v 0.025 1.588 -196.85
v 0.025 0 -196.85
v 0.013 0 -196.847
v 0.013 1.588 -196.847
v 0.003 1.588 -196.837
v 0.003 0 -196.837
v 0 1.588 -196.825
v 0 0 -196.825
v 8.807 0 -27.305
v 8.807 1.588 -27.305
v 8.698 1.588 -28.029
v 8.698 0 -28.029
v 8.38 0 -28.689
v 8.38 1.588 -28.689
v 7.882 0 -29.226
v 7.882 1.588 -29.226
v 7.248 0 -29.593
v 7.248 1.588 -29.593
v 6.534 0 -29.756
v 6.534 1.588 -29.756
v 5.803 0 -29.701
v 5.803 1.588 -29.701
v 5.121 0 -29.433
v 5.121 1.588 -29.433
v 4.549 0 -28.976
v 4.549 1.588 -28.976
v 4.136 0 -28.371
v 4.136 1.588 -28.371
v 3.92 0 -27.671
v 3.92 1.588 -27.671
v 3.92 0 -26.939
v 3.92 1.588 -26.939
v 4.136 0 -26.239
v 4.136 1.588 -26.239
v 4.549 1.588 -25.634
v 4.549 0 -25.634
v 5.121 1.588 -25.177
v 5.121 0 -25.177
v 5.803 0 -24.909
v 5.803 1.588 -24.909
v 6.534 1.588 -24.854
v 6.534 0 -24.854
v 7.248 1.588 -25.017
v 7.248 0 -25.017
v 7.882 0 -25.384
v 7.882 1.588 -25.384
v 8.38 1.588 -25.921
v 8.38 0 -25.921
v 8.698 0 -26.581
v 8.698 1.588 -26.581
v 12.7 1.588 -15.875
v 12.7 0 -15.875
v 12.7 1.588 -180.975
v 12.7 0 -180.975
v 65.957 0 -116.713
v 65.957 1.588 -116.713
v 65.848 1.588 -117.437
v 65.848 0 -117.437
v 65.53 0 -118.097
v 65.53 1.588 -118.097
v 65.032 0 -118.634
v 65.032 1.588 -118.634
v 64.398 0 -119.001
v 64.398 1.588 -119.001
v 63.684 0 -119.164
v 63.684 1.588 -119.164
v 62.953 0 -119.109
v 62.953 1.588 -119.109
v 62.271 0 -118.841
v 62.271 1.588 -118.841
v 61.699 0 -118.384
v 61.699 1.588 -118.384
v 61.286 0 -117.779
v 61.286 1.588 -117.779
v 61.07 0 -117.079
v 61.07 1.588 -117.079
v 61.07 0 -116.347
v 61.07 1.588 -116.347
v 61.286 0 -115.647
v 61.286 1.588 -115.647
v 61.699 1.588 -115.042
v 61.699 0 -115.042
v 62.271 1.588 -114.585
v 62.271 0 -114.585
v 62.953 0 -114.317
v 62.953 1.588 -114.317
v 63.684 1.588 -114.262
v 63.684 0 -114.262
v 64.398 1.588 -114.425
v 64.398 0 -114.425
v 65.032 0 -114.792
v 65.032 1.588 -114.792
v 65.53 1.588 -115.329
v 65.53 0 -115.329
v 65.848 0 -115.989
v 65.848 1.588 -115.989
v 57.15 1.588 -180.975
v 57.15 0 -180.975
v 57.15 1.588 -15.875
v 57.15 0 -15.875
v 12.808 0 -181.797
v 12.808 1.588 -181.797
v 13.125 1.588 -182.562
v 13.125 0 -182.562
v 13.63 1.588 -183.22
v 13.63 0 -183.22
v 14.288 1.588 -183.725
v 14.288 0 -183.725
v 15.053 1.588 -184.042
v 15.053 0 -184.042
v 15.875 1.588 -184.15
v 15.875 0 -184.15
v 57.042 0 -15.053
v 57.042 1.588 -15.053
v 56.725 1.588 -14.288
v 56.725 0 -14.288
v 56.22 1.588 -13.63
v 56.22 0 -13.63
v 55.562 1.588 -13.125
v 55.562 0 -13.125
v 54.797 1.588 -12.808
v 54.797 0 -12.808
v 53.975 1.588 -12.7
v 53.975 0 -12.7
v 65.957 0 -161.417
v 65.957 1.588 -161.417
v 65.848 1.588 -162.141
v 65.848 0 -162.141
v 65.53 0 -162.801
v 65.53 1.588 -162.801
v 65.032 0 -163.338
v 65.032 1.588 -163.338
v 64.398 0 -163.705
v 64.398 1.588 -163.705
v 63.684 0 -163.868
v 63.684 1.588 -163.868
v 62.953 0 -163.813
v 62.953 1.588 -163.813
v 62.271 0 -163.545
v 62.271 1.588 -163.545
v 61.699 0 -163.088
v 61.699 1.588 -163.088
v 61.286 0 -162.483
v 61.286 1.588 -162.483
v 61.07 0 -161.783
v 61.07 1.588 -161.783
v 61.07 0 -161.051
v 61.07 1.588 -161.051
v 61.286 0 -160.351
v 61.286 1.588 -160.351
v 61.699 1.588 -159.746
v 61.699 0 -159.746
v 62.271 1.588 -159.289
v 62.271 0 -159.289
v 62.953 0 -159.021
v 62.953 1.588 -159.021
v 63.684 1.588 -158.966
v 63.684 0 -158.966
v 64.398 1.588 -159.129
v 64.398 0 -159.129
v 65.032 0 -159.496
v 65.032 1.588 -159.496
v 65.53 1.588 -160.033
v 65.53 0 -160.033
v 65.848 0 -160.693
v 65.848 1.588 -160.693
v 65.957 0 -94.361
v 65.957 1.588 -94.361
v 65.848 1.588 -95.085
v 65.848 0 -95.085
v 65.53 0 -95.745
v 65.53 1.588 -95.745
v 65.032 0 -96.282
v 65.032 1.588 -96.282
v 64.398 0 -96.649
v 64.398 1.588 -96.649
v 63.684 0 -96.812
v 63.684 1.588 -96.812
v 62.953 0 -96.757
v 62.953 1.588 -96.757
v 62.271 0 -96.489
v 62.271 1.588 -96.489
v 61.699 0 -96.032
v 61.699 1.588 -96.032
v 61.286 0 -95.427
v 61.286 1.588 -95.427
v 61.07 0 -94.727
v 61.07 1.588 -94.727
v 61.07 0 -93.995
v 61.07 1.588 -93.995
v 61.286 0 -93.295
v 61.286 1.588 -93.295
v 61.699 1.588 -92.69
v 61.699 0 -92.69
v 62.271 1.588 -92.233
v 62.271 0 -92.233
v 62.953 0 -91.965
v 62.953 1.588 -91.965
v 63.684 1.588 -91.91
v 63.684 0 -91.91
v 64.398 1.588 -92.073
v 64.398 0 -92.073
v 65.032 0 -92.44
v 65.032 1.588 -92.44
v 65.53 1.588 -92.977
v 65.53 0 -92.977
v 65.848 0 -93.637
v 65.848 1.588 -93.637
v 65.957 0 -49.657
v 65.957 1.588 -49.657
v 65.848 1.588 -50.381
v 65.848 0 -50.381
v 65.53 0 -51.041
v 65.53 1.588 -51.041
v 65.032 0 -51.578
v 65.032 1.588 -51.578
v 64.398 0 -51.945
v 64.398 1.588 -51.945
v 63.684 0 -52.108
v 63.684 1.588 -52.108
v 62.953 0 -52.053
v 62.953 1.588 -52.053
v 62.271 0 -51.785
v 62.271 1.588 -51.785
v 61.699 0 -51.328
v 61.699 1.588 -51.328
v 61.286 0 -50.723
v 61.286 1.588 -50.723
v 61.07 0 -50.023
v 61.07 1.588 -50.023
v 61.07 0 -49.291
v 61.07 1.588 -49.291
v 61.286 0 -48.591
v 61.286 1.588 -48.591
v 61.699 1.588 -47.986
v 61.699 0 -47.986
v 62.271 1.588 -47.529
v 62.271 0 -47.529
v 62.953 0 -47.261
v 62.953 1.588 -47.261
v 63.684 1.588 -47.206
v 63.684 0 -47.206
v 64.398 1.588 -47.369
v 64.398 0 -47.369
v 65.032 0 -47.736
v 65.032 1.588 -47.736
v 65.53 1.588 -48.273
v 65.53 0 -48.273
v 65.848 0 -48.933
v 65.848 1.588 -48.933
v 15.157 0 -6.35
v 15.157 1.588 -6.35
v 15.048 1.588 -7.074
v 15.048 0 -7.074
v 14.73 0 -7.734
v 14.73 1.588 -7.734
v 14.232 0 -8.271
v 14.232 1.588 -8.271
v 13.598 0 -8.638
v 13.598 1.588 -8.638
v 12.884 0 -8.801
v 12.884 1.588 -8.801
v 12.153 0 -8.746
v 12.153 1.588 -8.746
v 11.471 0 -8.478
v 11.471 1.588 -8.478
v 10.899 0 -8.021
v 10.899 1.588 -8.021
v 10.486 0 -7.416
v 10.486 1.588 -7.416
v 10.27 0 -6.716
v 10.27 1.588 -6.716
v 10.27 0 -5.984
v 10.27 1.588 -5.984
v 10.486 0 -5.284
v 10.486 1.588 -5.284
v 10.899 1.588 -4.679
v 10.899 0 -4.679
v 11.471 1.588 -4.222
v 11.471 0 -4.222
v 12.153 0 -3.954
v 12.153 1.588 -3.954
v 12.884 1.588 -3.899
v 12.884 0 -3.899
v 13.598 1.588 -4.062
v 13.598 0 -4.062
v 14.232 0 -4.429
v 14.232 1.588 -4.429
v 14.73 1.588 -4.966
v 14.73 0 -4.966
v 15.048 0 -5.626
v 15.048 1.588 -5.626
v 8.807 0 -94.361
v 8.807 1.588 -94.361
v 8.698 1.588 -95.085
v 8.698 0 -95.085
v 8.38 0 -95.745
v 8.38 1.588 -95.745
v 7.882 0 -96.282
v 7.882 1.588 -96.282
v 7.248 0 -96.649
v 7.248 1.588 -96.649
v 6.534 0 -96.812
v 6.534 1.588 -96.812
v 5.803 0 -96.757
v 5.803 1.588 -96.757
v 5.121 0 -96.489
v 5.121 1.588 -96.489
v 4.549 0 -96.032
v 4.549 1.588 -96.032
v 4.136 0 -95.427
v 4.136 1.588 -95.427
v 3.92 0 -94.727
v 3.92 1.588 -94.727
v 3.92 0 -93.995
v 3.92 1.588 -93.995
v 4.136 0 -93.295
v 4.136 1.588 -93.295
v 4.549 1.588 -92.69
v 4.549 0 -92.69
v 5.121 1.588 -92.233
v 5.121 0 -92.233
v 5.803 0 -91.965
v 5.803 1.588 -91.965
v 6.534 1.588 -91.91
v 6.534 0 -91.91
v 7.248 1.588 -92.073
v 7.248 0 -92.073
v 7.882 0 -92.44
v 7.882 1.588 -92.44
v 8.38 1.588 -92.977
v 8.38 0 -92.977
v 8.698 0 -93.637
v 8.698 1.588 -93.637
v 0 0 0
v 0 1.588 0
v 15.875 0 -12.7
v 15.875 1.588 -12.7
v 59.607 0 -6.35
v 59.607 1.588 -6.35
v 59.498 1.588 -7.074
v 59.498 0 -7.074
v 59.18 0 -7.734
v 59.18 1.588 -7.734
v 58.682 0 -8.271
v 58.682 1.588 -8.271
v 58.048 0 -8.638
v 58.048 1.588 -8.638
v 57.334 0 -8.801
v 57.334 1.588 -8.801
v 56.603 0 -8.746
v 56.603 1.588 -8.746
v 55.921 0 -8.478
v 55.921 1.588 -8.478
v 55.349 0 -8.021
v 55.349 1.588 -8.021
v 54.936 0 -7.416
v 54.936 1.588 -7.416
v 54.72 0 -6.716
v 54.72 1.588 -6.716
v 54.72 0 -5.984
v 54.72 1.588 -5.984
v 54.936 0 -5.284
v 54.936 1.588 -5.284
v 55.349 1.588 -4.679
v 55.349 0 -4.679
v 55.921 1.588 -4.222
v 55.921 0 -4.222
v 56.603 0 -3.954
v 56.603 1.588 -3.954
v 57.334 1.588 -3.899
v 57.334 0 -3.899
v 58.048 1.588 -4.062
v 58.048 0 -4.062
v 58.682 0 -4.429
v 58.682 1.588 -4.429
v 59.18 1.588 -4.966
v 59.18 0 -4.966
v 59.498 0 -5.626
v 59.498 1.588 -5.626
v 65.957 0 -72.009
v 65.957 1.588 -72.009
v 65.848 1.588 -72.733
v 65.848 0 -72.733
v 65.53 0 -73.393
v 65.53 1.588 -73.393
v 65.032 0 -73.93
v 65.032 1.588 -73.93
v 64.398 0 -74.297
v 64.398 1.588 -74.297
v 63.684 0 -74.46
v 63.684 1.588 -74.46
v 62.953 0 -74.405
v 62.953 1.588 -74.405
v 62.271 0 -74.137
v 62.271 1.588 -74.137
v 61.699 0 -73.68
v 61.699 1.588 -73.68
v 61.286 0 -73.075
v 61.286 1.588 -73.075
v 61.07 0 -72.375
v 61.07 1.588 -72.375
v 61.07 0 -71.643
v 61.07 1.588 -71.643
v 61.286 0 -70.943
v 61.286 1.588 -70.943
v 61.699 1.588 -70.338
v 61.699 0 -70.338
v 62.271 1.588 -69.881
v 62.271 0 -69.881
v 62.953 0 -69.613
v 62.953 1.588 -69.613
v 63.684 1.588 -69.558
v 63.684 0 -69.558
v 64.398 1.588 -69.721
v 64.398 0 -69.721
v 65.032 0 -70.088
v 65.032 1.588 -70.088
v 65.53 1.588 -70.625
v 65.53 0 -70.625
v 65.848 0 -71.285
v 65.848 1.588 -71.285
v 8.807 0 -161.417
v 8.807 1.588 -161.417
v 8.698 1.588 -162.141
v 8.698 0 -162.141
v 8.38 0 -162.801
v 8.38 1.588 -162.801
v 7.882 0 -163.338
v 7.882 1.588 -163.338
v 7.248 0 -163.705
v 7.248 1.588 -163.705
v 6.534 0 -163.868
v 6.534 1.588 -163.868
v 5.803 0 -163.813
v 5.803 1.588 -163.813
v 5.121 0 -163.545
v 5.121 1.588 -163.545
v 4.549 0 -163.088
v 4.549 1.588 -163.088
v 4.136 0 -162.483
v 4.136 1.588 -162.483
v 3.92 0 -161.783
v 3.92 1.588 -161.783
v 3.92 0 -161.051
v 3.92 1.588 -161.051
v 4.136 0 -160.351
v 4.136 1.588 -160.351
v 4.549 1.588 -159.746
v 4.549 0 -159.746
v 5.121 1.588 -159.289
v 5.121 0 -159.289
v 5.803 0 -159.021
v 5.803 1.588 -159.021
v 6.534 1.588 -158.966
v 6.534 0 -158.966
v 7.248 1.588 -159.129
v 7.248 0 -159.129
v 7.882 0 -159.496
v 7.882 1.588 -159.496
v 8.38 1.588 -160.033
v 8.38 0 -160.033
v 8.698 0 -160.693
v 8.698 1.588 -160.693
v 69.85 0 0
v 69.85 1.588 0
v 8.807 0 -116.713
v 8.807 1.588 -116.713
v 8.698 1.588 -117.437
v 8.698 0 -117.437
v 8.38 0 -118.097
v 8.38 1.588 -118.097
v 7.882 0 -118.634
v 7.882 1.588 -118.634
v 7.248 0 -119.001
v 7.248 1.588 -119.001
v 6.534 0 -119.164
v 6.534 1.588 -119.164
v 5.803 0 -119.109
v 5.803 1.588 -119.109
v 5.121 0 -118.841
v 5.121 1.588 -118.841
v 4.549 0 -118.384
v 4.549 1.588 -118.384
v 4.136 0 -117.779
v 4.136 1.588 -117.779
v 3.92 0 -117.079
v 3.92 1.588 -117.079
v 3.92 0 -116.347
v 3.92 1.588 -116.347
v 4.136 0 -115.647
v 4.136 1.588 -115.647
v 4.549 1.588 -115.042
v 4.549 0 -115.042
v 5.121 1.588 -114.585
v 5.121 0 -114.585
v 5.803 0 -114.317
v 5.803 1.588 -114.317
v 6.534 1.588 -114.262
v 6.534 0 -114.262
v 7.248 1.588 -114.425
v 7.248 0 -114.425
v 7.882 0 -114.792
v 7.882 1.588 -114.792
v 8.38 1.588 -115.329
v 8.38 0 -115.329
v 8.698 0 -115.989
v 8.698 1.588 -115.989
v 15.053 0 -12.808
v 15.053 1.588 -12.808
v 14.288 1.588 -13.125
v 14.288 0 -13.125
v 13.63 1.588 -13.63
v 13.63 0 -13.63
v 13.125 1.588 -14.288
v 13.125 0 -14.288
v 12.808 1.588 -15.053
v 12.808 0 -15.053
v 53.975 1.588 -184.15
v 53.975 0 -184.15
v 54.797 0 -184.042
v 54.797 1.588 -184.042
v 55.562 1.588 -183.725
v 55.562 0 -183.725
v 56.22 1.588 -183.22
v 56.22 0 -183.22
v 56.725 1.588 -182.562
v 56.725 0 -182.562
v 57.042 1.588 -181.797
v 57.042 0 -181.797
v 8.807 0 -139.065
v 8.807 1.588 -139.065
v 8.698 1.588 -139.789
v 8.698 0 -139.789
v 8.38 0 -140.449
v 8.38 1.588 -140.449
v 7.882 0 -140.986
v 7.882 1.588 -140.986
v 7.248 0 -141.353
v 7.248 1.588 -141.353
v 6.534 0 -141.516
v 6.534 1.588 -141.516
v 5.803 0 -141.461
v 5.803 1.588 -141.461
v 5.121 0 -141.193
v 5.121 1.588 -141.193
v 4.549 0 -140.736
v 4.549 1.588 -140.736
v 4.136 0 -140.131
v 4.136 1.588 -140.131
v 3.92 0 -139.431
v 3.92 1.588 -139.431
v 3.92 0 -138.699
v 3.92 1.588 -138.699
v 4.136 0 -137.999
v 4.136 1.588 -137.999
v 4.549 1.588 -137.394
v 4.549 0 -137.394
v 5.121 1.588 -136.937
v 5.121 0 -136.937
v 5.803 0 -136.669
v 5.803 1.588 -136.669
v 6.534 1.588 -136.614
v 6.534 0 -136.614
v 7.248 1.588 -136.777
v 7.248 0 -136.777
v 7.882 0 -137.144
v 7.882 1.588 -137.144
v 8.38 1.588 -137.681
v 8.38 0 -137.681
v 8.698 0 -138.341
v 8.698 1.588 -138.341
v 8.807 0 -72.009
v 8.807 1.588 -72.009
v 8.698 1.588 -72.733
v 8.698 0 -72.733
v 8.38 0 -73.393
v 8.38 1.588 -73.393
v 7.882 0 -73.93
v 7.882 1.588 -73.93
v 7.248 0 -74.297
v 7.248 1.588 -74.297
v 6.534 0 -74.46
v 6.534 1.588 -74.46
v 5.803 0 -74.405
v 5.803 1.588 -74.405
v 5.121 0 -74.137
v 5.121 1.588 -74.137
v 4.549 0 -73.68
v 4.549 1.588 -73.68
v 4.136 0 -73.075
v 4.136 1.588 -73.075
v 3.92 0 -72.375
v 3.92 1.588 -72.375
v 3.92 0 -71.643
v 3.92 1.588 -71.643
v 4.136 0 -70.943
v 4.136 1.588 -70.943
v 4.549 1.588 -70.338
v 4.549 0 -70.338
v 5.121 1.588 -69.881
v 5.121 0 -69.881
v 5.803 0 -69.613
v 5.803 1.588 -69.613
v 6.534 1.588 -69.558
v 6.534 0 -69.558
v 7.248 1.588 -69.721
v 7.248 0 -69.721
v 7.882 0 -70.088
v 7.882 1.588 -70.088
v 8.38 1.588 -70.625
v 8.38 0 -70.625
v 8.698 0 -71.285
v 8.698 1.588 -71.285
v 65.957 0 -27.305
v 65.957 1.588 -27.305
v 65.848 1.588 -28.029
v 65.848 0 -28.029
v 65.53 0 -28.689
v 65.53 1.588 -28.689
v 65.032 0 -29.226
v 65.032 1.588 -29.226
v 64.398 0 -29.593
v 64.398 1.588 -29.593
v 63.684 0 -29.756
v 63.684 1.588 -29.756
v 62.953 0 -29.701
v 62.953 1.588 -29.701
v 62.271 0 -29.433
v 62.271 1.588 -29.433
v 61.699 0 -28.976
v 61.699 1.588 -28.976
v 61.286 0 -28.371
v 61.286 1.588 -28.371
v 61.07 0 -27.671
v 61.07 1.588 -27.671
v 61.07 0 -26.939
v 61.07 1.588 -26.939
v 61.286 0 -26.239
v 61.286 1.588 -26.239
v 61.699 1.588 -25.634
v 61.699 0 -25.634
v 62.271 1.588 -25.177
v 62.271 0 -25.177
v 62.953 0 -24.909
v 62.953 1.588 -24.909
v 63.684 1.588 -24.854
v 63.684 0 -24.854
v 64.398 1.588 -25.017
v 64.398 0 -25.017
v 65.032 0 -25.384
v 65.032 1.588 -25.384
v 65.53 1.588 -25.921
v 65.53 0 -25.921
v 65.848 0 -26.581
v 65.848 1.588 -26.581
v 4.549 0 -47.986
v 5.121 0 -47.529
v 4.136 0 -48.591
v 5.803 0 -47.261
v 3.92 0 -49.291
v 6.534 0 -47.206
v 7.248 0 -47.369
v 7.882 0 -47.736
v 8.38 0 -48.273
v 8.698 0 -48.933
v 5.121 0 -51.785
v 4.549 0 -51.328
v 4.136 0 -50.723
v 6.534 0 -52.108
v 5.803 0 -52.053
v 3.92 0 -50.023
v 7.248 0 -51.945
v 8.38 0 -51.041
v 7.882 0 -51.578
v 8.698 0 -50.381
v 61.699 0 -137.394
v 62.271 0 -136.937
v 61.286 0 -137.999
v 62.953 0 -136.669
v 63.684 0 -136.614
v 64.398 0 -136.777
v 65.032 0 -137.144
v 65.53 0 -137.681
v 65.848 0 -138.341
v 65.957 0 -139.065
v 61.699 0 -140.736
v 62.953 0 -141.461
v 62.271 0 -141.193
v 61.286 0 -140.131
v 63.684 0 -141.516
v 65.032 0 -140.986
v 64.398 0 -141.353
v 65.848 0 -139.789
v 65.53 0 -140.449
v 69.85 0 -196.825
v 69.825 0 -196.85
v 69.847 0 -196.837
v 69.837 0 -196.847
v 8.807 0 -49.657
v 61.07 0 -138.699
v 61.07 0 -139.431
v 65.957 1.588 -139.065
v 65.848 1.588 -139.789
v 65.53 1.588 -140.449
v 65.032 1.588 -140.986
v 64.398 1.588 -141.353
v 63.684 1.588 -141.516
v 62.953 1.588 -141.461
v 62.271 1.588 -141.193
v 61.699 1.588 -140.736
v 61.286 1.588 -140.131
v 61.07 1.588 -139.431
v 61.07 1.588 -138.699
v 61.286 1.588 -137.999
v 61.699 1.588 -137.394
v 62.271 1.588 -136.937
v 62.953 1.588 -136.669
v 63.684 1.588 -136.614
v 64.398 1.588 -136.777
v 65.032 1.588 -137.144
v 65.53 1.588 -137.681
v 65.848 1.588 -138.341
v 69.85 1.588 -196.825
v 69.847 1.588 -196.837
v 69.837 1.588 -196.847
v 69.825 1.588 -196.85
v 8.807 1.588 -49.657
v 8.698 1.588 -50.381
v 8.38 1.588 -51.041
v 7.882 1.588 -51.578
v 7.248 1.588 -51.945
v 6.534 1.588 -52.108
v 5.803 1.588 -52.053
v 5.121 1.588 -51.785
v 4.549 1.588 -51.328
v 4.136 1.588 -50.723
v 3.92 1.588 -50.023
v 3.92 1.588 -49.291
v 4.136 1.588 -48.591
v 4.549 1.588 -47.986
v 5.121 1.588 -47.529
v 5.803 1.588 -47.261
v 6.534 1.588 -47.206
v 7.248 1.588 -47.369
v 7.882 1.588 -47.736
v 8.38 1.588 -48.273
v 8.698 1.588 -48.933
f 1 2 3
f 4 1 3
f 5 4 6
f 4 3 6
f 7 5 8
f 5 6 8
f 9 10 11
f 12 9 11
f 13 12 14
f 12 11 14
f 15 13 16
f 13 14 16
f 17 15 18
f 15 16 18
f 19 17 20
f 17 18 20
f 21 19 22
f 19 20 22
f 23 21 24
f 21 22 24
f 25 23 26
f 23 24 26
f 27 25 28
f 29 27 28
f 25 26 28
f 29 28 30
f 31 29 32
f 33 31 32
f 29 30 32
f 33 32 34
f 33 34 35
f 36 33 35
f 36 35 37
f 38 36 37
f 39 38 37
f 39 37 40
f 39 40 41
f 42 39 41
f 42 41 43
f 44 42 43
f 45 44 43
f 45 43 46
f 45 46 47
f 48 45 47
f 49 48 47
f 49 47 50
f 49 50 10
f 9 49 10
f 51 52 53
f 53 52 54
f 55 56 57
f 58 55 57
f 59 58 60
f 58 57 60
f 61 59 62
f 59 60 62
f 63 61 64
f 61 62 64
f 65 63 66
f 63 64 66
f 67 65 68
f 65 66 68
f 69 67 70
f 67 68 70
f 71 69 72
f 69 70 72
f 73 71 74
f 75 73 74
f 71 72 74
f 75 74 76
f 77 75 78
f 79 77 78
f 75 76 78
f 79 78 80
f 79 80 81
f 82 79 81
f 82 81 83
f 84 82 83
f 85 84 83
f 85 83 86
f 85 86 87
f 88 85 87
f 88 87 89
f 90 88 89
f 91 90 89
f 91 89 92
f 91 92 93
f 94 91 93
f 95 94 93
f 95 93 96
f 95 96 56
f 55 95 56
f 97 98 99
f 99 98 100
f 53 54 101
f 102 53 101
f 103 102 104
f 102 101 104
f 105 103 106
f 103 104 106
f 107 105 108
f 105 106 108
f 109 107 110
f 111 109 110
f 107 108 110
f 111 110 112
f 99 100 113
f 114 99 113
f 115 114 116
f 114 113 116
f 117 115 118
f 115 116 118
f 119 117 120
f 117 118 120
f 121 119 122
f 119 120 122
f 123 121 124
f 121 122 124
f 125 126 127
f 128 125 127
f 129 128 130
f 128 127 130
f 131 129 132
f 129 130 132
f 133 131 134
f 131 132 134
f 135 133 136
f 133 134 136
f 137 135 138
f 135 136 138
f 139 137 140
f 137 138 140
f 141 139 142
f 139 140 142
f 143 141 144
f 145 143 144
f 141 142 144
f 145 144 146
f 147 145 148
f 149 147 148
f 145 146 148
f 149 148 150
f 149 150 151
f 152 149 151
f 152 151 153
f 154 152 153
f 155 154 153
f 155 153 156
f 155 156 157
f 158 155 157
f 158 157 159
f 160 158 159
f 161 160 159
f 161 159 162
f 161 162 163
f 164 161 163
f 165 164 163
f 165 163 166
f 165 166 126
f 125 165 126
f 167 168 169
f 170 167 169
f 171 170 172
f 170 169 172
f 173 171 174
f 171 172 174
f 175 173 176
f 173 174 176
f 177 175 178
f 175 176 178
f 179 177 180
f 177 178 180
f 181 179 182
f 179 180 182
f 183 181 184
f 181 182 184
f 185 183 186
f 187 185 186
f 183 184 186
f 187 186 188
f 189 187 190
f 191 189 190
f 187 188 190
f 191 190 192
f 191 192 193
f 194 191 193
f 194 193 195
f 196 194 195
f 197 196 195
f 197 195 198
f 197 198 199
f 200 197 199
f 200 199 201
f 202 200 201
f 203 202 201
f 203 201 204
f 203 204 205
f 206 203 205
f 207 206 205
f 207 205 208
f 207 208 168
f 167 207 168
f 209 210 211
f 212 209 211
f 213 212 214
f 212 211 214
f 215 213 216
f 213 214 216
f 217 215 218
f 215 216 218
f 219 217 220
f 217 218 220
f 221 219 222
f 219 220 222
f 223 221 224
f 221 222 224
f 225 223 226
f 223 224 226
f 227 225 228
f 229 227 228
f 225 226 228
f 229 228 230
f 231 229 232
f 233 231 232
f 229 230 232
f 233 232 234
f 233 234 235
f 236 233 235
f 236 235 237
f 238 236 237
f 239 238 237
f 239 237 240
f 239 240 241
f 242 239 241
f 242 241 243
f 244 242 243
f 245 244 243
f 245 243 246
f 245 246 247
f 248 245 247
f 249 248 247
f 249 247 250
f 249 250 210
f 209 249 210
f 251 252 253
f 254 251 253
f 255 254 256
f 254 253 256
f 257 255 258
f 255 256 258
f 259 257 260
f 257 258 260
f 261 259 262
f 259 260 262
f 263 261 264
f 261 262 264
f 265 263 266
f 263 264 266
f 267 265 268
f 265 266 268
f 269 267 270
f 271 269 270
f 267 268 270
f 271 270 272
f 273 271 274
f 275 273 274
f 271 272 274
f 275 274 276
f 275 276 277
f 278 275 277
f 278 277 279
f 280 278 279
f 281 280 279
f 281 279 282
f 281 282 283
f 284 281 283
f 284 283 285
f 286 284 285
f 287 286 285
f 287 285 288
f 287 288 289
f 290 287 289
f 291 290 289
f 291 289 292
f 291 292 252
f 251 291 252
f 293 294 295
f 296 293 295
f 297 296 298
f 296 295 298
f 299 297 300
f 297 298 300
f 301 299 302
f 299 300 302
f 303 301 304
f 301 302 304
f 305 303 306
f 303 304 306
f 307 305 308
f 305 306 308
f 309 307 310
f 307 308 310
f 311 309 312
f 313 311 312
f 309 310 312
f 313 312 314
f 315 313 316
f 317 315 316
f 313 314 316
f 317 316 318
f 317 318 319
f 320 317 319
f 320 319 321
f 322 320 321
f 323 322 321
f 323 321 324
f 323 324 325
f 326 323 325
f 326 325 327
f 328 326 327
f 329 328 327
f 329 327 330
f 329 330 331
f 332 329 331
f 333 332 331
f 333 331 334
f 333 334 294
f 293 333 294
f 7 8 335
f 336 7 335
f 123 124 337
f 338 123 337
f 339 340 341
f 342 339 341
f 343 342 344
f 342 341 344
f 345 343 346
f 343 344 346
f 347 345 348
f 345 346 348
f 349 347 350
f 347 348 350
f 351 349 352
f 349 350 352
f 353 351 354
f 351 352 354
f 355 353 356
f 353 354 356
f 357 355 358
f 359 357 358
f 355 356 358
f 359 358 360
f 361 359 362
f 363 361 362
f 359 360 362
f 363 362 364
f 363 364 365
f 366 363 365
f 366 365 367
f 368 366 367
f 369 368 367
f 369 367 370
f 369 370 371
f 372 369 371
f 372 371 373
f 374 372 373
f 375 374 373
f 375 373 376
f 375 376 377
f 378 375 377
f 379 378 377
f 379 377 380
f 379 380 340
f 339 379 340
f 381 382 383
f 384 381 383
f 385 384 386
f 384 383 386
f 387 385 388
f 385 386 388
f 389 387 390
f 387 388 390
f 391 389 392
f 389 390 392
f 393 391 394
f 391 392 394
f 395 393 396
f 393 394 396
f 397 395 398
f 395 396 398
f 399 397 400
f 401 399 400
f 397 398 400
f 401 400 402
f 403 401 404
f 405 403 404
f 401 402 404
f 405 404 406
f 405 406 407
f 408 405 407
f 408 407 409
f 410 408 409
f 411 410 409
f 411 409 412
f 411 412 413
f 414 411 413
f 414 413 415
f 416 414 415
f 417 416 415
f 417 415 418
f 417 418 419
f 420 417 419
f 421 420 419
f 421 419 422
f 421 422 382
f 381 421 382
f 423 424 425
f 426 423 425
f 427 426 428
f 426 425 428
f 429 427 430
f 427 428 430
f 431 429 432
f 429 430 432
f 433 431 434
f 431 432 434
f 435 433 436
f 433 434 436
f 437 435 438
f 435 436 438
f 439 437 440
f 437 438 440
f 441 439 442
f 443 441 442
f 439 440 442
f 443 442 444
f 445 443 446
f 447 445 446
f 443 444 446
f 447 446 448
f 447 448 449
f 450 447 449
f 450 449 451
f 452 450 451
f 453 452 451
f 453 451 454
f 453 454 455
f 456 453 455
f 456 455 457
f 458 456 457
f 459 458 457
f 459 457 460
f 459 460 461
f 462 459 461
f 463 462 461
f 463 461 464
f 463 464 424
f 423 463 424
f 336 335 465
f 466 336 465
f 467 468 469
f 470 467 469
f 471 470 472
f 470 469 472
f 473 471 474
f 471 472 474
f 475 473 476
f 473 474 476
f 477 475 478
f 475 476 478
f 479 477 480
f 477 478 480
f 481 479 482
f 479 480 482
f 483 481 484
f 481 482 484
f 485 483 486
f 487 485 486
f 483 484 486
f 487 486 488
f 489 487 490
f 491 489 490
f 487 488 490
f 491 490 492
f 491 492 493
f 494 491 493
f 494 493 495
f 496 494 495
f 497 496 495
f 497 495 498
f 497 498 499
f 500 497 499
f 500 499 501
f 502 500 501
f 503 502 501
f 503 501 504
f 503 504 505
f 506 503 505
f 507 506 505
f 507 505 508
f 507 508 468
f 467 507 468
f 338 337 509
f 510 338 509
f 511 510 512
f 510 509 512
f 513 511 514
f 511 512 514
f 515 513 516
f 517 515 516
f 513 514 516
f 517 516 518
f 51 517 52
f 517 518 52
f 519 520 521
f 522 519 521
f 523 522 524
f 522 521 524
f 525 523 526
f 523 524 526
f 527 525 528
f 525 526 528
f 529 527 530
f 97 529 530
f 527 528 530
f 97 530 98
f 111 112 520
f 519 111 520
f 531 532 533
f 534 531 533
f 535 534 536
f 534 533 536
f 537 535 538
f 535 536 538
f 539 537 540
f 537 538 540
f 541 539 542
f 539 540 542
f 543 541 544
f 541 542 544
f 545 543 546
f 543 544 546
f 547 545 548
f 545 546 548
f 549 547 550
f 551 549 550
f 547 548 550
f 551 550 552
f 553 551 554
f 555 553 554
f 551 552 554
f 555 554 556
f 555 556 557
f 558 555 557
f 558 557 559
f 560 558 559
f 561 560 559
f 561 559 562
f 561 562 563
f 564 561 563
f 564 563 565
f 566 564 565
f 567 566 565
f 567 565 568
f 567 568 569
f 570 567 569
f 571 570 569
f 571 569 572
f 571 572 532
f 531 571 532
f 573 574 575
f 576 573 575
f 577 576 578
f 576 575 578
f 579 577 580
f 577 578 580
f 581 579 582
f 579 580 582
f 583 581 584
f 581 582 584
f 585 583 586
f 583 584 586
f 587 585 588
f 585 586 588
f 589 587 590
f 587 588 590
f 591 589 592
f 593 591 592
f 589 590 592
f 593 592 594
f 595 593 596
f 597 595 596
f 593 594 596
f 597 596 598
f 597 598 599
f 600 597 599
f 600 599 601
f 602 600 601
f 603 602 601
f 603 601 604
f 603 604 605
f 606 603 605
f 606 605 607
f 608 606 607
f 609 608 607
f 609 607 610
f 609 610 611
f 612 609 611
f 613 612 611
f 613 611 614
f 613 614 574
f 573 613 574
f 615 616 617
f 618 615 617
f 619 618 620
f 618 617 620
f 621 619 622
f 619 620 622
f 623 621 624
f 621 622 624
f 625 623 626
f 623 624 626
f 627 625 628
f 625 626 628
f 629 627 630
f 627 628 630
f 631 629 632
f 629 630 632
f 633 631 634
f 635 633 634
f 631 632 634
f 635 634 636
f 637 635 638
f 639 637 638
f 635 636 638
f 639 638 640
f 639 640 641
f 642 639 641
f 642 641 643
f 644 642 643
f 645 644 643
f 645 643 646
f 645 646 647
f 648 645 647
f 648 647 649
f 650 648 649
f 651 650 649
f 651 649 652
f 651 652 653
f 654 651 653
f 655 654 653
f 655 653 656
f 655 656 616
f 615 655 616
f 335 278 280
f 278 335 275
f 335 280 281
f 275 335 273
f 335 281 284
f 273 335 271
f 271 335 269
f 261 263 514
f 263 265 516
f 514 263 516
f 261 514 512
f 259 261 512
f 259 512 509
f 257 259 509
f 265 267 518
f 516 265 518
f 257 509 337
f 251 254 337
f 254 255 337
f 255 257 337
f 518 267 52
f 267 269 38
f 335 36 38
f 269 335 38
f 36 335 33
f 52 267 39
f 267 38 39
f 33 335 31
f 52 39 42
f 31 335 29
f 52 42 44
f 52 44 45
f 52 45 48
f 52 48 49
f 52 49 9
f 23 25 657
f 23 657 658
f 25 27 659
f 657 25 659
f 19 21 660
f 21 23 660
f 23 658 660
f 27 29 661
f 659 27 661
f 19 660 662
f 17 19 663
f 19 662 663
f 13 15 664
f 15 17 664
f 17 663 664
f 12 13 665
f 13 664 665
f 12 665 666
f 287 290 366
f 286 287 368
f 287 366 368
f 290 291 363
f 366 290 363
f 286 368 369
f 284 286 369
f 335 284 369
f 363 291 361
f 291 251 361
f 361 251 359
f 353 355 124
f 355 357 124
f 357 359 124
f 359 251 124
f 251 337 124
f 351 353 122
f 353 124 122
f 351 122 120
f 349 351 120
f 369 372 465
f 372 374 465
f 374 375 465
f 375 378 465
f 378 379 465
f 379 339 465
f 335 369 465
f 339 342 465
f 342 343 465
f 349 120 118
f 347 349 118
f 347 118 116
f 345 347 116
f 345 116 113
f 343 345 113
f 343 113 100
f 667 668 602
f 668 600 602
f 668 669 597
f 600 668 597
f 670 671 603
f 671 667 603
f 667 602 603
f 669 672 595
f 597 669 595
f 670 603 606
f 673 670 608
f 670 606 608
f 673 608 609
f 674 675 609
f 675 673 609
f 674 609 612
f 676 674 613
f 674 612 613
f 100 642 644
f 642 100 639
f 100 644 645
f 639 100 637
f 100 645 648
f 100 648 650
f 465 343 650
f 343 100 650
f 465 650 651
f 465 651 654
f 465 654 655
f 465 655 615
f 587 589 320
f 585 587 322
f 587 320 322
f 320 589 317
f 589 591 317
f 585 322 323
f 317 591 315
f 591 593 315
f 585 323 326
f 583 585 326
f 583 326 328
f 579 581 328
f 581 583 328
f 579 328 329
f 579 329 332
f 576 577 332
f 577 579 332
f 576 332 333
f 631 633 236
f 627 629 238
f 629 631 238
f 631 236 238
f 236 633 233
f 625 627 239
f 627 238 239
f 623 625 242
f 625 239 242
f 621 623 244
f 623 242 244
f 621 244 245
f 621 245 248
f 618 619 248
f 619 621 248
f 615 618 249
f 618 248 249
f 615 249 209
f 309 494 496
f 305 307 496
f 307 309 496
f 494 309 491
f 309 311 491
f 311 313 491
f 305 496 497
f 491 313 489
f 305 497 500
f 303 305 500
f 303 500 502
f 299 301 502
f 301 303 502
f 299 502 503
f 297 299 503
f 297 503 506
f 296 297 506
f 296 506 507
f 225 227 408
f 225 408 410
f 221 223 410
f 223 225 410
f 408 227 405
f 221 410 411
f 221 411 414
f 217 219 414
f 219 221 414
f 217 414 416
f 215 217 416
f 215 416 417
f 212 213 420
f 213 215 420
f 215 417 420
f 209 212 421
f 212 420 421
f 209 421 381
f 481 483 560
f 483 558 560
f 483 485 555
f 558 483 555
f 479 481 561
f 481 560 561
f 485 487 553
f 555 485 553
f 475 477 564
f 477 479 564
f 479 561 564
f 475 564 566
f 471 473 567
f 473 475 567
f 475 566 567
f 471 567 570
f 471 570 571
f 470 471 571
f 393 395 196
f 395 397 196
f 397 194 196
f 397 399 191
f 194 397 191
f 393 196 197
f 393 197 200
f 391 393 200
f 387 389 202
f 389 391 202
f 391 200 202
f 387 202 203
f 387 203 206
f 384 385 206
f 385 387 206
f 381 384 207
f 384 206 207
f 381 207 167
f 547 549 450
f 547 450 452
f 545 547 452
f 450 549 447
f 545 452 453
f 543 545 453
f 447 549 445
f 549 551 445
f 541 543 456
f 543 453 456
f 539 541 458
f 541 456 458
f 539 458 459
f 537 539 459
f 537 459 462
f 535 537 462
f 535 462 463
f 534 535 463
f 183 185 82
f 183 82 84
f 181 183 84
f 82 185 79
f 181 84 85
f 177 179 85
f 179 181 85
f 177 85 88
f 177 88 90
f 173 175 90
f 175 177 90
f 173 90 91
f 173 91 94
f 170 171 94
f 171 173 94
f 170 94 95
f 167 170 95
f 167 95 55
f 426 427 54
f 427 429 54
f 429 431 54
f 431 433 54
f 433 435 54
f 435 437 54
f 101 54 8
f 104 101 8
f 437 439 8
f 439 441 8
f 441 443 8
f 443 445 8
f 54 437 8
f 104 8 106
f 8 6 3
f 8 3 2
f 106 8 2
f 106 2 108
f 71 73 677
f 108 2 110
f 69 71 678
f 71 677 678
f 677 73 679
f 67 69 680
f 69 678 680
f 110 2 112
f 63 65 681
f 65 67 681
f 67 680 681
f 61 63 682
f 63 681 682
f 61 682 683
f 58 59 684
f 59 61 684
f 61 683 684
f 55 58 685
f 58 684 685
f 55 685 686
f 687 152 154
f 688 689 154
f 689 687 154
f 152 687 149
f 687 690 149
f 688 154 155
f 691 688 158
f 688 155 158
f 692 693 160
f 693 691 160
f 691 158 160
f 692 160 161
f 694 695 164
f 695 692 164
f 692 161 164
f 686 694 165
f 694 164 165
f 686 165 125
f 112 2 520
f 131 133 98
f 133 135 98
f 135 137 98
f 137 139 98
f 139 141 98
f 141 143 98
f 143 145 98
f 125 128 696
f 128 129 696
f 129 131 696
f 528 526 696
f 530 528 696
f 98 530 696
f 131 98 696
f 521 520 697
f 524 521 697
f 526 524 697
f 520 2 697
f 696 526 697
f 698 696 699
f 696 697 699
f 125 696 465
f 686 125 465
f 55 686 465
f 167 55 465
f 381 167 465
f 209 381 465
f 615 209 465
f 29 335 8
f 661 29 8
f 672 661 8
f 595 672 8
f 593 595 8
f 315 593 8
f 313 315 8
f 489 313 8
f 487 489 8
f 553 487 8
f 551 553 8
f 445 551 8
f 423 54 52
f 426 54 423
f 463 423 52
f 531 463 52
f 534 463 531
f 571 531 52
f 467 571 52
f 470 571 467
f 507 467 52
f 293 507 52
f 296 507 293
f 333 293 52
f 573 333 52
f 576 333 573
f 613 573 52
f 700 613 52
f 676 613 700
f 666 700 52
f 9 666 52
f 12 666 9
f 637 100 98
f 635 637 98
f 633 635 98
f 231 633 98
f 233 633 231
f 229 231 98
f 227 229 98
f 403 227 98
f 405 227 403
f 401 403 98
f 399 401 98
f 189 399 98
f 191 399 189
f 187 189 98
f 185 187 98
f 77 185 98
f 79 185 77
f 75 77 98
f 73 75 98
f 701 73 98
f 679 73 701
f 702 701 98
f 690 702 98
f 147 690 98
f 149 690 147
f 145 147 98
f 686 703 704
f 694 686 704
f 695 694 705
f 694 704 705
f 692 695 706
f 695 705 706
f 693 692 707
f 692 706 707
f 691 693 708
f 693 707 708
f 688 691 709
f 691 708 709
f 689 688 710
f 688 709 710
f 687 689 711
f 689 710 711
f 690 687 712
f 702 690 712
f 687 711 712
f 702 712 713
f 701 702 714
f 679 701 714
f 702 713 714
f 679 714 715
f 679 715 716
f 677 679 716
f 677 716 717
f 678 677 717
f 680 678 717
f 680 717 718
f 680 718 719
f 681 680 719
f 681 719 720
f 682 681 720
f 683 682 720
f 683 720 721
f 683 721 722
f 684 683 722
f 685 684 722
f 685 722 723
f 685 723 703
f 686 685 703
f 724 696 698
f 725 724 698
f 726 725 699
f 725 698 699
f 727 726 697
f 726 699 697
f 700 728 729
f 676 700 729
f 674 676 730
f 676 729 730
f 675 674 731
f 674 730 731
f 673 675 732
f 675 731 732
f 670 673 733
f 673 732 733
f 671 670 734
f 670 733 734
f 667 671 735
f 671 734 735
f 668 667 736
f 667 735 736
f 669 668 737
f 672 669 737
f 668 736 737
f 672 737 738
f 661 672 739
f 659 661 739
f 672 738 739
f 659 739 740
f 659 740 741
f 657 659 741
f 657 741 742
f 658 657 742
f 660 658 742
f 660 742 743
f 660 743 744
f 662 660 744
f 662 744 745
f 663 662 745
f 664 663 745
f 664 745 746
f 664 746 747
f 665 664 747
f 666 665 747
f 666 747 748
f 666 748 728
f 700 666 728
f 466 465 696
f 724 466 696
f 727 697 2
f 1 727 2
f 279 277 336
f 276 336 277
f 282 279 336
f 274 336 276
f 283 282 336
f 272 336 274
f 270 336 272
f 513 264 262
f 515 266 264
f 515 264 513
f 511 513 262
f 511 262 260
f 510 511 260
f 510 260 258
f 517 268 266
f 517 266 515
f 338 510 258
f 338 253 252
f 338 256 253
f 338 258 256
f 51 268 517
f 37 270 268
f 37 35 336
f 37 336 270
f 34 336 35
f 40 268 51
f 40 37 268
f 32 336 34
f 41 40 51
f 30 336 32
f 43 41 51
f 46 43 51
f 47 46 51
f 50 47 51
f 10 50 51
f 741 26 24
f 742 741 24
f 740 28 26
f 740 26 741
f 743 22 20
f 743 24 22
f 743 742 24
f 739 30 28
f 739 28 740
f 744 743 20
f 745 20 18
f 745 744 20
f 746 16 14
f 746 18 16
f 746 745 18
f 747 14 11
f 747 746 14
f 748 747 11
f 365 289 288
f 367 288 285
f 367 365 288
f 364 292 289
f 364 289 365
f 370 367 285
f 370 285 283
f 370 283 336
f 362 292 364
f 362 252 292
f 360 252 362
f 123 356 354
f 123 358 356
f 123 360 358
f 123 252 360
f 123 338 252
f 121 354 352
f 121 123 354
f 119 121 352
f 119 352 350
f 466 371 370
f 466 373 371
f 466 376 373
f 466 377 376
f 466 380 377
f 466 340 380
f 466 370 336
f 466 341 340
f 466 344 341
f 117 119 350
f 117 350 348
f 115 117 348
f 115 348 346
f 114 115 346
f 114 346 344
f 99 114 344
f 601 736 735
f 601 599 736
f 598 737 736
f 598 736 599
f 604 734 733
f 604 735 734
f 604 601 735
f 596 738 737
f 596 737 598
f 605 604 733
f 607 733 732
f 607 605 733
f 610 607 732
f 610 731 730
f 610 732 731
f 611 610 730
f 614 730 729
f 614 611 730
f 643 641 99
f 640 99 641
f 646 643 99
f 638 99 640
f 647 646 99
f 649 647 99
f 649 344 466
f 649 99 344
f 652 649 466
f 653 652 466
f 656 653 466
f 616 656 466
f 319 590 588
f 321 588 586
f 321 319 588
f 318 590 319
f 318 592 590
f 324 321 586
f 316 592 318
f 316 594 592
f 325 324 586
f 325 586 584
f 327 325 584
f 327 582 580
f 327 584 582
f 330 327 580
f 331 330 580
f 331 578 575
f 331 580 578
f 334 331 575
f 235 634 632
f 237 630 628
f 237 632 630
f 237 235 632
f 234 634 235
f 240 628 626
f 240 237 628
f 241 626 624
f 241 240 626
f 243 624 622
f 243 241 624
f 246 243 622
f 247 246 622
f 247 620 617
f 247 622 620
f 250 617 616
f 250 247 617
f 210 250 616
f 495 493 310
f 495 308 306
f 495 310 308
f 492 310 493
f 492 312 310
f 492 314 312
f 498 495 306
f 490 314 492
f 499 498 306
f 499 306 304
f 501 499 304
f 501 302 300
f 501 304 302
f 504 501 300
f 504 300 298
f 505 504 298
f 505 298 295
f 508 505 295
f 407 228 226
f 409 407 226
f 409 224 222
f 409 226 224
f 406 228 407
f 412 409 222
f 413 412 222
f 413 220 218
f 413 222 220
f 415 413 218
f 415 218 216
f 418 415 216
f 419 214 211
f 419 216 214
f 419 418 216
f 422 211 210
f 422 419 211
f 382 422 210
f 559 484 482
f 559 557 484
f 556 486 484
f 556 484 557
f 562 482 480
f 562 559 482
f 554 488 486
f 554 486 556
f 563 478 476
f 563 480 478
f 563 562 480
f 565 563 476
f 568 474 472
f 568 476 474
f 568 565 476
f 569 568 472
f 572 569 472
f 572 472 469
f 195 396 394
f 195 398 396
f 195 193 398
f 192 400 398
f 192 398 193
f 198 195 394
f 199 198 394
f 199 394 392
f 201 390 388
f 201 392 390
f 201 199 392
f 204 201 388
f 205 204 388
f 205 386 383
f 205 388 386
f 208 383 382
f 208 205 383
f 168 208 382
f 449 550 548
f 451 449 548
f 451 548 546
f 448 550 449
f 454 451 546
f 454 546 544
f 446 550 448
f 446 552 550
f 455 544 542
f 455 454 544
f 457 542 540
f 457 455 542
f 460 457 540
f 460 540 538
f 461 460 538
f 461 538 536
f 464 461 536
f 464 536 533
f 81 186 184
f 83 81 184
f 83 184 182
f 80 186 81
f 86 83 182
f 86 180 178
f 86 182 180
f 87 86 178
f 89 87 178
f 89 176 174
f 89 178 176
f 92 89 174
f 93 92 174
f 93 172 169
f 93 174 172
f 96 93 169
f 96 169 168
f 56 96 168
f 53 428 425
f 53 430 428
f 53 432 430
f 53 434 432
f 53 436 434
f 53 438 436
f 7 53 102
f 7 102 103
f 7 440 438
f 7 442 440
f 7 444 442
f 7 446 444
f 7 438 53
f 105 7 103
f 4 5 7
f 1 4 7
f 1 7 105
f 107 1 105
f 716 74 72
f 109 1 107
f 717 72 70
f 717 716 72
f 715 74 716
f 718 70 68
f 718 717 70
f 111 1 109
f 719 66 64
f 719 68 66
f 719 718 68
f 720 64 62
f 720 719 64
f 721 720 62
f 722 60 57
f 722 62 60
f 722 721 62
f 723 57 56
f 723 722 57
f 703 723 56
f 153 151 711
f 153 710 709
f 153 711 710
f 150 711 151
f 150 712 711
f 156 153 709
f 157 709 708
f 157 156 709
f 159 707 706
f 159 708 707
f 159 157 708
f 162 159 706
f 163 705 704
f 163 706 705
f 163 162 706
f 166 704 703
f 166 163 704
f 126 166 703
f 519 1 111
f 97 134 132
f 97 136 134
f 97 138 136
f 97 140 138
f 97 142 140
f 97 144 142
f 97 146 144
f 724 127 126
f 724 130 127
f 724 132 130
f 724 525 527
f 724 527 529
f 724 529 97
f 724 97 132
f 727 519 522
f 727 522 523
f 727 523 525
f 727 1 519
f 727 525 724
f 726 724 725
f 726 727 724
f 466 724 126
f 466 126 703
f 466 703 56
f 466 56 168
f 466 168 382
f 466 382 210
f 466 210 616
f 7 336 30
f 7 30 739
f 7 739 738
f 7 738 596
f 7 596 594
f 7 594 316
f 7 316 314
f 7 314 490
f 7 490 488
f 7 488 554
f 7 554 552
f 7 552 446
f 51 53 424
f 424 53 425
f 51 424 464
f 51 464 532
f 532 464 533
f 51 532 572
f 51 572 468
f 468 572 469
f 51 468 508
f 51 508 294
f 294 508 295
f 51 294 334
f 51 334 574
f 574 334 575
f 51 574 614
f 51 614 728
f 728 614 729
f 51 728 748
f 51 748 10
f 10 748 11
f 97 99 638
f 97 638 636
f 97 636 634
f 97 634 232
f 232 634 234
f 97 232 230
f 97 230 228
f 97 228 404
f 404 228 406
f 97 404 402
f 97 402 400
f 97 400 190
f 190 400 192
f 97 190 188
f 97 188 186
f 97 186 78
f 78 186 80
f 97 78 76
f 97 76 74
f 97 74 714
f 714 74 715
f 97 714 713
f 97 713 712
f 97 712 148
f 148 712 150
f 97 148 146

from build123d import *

# Parameters (mm, degrees)
BOSS_EXTRUDE1_DEPTH   = 1.5875
F_8_CLEARANCE_HOLE1_D = 4.9149


with BuildPart() as part:
    # Sketch1 → Boss-Extrude1 (new body)
    with BuildSketch(Plane(origin=(0, 0, 0), x_dir=(1, 0, 0), z_dir=(0, 1, 0))):
        with BuildLine():
            Line((0, 0), (69.85, 0))
            Line((69.85, 0), (69.85, 196.8246))
            ThreePointArc((69.85, 196.8246), (69.842560512, 196.842560512), (69.8246, 196.85))
            Line((69.8246, 196.85), (0.0254, 196.85))
            ThreePointArc((0.0254, 196.85), (0.007439488, 196.842560512), (0, 196.8246))
            Line((0, 196.8246), (0, 0))
        make_face()
        with BuildLine():
            Line((12.7, 15.875), (12.7, 180.975))
            ThreePointArc((12.7, 180.975), (13.62993597, 183.22006403), (15.875, 184.15))
            Line((15.875, 184.15), (53.975, 184.15))
            ThreePointArc((53.975, 184.15), (56.22006403, 183.22006403), (57.15, 180.975))
            Line((57.15, 180.975), (57.15, 15.875))
            ThreePointArc((57.15, 15.875), (56.22006403, 13.62993597), (53.975, 12.7))
            Line((53.975, 12.7), (15.875, 12.7))
            ThreePointArc((15.875, 12.7), (13.62993597, 13.62993597), (12.7, 15.875))
        make_face(mode=Mode.SUBTRACT)
    extrude(amount=BOSS_EXTRUDE1_DEPTH)

    # #8 Clearance Hole1 (through all)
    with Locations(Plane(origin=(0, 0, 0), x_dir=(-1, 0, 0), z_dir=(0, -1, 0))):
        with Locations((-6.35, 161.417), (-57.15, 6.35), (-12.7, 6.35), (-63.5, 27.305), (-6.35, 27.305), (-63.5, 139.065), (-63.5, 116.713), (-63.5, 94.361), (-63.5, 72.009), (-6.35, 49.657), (-6.35, 72.009), (-6.35, 94.361), (-6.35, 116.713), (-6.35, 139.065), (-63.5, 49.657), (-63.5, 161.417)):
            Hole(F_8_CLEARANCE_HOLE1_D / 2)


solid = part.part
